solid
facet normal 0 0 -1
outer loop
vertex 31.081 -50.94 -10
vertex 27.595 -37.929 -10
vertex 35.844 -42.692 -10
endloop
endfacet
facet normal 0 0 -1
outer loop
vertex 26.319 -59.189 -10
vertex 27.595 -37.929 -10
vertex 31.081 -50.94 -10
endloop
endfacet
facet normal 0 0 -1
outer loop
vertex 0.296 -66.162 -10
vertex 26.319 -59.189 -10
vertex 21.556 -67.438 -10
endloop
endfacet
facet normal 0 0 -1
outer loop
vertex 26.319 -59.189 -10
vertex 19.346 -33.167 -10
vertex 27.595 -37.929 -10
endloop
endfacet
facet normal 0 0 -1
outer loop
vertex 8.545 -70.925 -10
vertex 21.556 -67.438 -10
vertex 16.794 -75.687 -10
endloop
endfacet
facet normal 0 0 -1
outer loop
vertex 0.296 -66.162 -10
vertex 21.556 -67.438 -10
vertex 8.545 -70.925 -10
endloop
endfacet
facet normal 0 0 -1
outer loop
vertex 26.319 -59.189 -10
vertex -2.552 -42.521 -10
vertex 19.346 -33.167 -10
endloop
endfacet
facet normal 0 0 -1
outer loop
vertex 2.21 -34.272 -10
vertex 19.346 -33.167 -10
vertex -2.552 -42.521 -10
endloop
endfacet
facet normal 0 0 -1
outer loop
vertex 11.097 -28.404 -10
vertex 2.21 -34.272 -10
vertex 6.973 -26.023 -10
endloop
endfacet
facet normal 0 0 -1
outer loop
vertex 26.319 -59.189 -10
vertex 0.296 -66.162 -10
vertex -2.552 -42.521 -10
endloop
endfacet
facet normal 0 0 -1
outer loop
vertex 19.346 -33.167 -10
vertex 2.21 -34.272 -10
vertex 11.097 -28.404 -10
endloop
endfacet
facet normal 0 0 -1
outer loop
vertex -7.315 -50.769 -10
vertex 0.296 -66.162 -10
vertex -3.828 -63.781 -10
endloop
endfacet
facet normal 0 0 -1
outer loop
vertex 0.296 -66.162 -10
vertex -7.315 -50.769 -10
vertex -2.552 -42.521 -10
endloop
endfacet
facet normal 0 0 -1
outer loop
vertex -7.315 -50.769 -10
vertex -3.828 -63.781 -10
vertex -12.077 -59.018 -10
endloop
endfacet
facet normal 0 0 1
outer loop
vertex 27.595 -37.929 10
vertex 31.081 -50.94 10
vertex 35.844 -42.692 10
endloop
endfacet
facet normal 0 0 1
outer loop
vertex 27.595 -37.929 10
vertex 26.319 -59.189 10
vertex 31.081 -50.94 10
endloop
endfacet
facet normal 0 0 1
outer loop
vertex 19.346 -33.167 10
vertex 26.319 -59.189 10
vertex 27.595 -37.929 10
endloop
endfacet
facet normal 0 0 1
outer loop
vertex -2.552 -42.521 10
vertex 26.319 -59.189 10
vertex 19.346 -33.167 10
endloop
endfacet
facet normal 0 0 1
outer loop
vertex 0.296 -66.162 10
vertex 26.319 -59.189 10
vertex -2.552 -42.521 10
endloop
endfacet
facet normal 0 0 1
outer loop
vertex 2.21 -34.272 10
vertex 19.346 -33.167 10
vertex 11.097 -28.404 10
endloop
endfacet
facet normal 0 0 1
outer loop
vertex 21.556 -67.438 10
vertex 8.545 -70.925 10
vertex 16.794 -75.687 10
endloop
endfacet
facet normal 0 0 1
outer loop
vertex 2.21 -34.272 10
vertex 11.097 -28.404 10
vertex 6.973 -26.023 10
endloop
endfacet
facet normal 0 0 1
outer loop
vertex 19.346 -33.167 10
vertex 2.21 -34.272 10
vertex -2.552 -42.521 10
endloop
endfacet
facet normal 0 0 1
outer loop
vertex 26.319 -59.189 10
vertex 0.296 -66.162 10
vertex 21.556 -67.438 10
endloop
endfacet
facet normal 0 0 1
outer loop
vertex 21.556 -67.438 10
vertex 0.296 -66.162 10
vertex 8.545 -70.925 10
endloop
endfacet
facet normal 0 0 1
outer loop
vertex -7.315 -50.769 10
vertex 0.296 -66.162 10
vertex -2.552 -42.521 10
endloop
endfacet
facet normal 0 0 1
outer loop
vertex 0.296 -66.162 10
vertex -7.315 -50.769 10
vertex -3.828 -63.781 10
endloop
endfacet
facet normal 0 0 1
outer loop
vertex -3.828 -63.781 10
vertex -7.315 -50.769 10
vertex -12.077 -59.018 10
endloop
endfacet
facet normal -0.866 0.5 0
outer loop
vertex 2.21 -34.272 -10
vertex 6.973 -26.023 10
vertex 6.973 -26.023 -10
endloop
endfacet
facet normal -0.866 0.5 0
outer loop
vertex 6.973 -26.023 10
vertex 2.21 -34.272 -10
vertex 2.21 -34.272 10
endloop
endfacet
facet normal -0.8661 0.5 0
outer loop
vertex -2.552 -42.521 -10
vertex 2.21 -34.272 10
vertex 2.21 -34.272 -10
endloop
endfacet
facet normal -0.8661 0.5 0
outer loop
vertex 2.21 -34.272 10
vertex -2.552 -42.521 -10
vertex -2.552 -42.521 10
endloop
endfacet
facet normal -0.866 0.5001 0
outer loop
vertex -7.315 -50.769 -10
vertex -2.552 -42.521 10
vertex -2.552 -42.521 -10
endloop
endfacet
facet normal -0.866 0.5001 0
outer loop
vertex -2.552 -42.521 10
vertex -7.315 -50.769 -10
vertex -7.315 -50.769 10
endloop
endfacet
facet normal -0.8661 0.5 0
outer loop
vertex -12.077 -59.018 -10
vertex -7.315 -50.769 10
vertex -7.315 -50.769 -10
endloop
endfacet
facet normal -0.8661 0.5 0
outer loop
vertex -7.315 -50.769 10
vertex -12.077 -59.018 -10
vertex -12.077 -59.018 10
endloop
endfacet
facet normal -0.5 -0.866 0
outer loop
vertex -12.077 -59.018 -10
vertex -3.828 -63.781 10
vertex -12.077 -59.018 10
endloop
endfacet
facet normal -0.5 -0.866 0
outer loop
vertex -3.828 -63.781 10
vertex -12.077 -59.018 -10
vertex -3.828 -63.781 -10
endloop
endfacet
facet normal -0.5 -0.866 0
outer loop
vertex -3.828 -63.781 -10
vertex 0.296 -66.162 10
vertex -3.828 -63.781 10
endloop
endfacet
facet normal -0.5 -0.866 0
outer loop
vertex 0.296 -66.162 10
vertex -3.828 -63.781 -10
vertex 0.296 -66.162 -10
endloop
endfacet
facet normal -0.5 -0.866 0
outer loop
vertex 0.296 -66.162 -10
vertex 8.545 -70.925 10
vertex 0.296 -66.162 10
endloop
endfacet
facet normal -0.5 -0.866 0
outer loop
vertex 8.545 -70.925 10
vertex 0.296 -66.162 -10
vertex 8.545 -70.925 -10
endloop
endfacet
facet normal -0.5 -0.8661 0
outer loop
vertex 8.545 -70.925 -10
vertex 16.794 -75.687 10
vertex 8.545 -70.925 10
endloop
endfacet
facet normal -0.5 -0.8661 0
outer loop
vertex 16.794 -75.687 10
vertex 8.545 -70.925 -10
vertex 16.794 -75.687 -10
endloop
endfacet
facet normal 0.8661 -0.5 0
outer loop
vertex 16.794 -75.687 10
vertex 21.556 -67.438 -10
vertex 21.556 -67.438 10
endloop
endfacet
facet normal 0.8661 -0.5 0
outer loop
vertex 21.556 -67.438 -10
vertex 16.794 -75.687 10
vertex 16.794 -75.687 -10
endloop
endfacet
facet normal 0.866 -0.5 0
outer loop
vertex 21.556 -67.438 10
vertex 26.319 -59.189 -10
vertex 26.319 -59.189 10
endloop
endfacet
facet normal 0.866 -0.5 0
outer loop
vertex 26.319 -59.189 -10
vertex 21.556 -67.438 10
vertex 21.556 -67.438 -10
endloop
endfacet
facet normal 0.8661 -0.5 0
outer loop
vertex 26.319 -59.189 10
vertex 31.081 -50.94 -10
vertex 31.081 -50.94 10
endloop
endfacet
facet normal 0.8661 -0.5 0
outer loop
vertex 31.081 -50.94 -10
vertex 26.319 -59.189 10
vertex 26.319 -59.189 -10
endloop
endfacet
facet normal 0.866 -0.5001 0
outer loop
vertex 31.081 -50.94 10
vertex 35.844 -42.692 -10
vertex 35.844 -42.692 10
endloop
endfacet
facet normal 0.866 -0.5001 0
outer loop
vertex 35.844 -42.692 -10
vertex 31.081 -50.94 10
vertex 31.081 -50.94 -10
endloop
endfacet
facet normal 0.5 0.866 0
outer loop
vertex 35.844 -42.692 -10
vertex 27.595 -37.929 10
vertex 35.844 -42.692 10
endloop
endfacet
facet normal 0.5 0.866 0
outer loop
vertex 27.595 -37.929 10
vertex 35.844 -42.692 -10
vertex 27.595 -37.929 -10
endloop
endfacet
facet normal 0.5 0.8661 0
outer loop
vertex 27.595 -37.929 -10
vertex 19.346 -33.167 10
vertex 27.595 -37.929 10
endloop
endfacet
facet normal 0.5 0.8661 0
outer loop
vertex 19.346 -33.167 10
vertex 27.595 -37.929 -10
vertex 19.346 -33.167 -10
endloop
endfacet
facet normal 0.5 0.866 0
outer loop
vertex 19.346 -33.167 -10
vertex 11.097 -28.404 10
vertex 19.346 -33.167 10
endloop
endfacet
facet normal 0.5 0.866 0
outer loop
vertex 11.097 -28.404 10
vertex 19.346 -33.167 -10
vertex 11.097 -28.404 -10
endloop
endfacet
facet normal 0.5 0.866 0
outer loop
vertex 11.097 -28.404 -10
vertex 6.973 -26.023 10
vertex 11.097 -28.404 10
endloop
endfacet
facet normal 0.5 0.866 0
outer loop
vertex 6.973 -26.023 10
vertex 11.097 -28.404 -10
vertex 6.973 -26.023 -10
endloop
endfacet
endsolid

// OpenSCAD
polyhedron(
    points=[
    [6.97278394209356, -26.0227839420936, -10],
    [2.21028394209356, -34.2716759131403, -10],
    [-2.55221605790644, -42.5205678841871, -10],
    [-7.31471605790644, -50.7694598552339, -10],
    [-12.0772160579064, -59.0183518262807, -10],
    [-3.82832408685966, -63.7808518262807, -10],
    [0.296121898663728, -66.1621018262807, -10],
    [8.54501386971051, -70.9246018262807, -10],
    [16.7939058407573, -75.6871018262807, -10],
    [21.5564058407573, -67.4382098552339, -10],
    [26.3189058407573, -59.1893178841871, -10],
    [31.0814058407573, -50.9404259131403, -10],
    [35.8439058407573, -42.6915339420935, -10],
    [27.5950138697105, -37.9290339420936, -10],
    [19.3461218986637, -33.1665339420936, -10],
    [11.0972299276169, -28.4040339420936, -10],
    [6.97278394209356, -26.0227839420936, 10],
    [2.21028394209356, -34.2716759131403, 10],
    [-2.55221605790644, -42.5205678841871, 10],
    [-7.31471605790644, -50.7694598552339, 10],
    [-12.0772160579064, -59.0183518262807, 10],
    [-3.82832408685966, -63.7808518262807, 10],
    [0.296121898663728, -66.1621018262807, 10],
    [8.54501386971051, -70.9246018262807, 10],
    [16.7939058407573, -75.6871018262807, 10],
    [21.5564058407573, -67.4382098552339, 10],
    [26.3189058407573, -59.1893178841871, 10],
    [31.0814058407573, -50.9404259131403, 10],
    [35.8439058407573, -42.6915339420935, 10],
    [27.5950138697105, -37.9290339420936, 10],
    [19.3461218986637, -33.1665339420936, 10],
    [11.0972299276169, -28.4040339420936, 10],
    ],
    faces=[
        [0,1,2,3,4,5,6,7,8,9,10,11,12,13,14,15],
        [31,30,29,28,27,26,25,24,23,22,21,20,19,18,17,16],
        [0,16,17,1],
        [1,17,18,2],
        [2,18,19,3],
        [3,19,20,4],
        [4,20,21,5],
        [5,21,22,6],
        [6,22,23,7],
        [7,23,24,8],
        [8,24,25,9],
        [9,25,26,10],
        [10,26,27,11],
        [11,27,28,12],
        [12,28,29,13],
        [13,29,30,14],
        [14,30,31,15],
        [15,31,16,0],
    ]
);
